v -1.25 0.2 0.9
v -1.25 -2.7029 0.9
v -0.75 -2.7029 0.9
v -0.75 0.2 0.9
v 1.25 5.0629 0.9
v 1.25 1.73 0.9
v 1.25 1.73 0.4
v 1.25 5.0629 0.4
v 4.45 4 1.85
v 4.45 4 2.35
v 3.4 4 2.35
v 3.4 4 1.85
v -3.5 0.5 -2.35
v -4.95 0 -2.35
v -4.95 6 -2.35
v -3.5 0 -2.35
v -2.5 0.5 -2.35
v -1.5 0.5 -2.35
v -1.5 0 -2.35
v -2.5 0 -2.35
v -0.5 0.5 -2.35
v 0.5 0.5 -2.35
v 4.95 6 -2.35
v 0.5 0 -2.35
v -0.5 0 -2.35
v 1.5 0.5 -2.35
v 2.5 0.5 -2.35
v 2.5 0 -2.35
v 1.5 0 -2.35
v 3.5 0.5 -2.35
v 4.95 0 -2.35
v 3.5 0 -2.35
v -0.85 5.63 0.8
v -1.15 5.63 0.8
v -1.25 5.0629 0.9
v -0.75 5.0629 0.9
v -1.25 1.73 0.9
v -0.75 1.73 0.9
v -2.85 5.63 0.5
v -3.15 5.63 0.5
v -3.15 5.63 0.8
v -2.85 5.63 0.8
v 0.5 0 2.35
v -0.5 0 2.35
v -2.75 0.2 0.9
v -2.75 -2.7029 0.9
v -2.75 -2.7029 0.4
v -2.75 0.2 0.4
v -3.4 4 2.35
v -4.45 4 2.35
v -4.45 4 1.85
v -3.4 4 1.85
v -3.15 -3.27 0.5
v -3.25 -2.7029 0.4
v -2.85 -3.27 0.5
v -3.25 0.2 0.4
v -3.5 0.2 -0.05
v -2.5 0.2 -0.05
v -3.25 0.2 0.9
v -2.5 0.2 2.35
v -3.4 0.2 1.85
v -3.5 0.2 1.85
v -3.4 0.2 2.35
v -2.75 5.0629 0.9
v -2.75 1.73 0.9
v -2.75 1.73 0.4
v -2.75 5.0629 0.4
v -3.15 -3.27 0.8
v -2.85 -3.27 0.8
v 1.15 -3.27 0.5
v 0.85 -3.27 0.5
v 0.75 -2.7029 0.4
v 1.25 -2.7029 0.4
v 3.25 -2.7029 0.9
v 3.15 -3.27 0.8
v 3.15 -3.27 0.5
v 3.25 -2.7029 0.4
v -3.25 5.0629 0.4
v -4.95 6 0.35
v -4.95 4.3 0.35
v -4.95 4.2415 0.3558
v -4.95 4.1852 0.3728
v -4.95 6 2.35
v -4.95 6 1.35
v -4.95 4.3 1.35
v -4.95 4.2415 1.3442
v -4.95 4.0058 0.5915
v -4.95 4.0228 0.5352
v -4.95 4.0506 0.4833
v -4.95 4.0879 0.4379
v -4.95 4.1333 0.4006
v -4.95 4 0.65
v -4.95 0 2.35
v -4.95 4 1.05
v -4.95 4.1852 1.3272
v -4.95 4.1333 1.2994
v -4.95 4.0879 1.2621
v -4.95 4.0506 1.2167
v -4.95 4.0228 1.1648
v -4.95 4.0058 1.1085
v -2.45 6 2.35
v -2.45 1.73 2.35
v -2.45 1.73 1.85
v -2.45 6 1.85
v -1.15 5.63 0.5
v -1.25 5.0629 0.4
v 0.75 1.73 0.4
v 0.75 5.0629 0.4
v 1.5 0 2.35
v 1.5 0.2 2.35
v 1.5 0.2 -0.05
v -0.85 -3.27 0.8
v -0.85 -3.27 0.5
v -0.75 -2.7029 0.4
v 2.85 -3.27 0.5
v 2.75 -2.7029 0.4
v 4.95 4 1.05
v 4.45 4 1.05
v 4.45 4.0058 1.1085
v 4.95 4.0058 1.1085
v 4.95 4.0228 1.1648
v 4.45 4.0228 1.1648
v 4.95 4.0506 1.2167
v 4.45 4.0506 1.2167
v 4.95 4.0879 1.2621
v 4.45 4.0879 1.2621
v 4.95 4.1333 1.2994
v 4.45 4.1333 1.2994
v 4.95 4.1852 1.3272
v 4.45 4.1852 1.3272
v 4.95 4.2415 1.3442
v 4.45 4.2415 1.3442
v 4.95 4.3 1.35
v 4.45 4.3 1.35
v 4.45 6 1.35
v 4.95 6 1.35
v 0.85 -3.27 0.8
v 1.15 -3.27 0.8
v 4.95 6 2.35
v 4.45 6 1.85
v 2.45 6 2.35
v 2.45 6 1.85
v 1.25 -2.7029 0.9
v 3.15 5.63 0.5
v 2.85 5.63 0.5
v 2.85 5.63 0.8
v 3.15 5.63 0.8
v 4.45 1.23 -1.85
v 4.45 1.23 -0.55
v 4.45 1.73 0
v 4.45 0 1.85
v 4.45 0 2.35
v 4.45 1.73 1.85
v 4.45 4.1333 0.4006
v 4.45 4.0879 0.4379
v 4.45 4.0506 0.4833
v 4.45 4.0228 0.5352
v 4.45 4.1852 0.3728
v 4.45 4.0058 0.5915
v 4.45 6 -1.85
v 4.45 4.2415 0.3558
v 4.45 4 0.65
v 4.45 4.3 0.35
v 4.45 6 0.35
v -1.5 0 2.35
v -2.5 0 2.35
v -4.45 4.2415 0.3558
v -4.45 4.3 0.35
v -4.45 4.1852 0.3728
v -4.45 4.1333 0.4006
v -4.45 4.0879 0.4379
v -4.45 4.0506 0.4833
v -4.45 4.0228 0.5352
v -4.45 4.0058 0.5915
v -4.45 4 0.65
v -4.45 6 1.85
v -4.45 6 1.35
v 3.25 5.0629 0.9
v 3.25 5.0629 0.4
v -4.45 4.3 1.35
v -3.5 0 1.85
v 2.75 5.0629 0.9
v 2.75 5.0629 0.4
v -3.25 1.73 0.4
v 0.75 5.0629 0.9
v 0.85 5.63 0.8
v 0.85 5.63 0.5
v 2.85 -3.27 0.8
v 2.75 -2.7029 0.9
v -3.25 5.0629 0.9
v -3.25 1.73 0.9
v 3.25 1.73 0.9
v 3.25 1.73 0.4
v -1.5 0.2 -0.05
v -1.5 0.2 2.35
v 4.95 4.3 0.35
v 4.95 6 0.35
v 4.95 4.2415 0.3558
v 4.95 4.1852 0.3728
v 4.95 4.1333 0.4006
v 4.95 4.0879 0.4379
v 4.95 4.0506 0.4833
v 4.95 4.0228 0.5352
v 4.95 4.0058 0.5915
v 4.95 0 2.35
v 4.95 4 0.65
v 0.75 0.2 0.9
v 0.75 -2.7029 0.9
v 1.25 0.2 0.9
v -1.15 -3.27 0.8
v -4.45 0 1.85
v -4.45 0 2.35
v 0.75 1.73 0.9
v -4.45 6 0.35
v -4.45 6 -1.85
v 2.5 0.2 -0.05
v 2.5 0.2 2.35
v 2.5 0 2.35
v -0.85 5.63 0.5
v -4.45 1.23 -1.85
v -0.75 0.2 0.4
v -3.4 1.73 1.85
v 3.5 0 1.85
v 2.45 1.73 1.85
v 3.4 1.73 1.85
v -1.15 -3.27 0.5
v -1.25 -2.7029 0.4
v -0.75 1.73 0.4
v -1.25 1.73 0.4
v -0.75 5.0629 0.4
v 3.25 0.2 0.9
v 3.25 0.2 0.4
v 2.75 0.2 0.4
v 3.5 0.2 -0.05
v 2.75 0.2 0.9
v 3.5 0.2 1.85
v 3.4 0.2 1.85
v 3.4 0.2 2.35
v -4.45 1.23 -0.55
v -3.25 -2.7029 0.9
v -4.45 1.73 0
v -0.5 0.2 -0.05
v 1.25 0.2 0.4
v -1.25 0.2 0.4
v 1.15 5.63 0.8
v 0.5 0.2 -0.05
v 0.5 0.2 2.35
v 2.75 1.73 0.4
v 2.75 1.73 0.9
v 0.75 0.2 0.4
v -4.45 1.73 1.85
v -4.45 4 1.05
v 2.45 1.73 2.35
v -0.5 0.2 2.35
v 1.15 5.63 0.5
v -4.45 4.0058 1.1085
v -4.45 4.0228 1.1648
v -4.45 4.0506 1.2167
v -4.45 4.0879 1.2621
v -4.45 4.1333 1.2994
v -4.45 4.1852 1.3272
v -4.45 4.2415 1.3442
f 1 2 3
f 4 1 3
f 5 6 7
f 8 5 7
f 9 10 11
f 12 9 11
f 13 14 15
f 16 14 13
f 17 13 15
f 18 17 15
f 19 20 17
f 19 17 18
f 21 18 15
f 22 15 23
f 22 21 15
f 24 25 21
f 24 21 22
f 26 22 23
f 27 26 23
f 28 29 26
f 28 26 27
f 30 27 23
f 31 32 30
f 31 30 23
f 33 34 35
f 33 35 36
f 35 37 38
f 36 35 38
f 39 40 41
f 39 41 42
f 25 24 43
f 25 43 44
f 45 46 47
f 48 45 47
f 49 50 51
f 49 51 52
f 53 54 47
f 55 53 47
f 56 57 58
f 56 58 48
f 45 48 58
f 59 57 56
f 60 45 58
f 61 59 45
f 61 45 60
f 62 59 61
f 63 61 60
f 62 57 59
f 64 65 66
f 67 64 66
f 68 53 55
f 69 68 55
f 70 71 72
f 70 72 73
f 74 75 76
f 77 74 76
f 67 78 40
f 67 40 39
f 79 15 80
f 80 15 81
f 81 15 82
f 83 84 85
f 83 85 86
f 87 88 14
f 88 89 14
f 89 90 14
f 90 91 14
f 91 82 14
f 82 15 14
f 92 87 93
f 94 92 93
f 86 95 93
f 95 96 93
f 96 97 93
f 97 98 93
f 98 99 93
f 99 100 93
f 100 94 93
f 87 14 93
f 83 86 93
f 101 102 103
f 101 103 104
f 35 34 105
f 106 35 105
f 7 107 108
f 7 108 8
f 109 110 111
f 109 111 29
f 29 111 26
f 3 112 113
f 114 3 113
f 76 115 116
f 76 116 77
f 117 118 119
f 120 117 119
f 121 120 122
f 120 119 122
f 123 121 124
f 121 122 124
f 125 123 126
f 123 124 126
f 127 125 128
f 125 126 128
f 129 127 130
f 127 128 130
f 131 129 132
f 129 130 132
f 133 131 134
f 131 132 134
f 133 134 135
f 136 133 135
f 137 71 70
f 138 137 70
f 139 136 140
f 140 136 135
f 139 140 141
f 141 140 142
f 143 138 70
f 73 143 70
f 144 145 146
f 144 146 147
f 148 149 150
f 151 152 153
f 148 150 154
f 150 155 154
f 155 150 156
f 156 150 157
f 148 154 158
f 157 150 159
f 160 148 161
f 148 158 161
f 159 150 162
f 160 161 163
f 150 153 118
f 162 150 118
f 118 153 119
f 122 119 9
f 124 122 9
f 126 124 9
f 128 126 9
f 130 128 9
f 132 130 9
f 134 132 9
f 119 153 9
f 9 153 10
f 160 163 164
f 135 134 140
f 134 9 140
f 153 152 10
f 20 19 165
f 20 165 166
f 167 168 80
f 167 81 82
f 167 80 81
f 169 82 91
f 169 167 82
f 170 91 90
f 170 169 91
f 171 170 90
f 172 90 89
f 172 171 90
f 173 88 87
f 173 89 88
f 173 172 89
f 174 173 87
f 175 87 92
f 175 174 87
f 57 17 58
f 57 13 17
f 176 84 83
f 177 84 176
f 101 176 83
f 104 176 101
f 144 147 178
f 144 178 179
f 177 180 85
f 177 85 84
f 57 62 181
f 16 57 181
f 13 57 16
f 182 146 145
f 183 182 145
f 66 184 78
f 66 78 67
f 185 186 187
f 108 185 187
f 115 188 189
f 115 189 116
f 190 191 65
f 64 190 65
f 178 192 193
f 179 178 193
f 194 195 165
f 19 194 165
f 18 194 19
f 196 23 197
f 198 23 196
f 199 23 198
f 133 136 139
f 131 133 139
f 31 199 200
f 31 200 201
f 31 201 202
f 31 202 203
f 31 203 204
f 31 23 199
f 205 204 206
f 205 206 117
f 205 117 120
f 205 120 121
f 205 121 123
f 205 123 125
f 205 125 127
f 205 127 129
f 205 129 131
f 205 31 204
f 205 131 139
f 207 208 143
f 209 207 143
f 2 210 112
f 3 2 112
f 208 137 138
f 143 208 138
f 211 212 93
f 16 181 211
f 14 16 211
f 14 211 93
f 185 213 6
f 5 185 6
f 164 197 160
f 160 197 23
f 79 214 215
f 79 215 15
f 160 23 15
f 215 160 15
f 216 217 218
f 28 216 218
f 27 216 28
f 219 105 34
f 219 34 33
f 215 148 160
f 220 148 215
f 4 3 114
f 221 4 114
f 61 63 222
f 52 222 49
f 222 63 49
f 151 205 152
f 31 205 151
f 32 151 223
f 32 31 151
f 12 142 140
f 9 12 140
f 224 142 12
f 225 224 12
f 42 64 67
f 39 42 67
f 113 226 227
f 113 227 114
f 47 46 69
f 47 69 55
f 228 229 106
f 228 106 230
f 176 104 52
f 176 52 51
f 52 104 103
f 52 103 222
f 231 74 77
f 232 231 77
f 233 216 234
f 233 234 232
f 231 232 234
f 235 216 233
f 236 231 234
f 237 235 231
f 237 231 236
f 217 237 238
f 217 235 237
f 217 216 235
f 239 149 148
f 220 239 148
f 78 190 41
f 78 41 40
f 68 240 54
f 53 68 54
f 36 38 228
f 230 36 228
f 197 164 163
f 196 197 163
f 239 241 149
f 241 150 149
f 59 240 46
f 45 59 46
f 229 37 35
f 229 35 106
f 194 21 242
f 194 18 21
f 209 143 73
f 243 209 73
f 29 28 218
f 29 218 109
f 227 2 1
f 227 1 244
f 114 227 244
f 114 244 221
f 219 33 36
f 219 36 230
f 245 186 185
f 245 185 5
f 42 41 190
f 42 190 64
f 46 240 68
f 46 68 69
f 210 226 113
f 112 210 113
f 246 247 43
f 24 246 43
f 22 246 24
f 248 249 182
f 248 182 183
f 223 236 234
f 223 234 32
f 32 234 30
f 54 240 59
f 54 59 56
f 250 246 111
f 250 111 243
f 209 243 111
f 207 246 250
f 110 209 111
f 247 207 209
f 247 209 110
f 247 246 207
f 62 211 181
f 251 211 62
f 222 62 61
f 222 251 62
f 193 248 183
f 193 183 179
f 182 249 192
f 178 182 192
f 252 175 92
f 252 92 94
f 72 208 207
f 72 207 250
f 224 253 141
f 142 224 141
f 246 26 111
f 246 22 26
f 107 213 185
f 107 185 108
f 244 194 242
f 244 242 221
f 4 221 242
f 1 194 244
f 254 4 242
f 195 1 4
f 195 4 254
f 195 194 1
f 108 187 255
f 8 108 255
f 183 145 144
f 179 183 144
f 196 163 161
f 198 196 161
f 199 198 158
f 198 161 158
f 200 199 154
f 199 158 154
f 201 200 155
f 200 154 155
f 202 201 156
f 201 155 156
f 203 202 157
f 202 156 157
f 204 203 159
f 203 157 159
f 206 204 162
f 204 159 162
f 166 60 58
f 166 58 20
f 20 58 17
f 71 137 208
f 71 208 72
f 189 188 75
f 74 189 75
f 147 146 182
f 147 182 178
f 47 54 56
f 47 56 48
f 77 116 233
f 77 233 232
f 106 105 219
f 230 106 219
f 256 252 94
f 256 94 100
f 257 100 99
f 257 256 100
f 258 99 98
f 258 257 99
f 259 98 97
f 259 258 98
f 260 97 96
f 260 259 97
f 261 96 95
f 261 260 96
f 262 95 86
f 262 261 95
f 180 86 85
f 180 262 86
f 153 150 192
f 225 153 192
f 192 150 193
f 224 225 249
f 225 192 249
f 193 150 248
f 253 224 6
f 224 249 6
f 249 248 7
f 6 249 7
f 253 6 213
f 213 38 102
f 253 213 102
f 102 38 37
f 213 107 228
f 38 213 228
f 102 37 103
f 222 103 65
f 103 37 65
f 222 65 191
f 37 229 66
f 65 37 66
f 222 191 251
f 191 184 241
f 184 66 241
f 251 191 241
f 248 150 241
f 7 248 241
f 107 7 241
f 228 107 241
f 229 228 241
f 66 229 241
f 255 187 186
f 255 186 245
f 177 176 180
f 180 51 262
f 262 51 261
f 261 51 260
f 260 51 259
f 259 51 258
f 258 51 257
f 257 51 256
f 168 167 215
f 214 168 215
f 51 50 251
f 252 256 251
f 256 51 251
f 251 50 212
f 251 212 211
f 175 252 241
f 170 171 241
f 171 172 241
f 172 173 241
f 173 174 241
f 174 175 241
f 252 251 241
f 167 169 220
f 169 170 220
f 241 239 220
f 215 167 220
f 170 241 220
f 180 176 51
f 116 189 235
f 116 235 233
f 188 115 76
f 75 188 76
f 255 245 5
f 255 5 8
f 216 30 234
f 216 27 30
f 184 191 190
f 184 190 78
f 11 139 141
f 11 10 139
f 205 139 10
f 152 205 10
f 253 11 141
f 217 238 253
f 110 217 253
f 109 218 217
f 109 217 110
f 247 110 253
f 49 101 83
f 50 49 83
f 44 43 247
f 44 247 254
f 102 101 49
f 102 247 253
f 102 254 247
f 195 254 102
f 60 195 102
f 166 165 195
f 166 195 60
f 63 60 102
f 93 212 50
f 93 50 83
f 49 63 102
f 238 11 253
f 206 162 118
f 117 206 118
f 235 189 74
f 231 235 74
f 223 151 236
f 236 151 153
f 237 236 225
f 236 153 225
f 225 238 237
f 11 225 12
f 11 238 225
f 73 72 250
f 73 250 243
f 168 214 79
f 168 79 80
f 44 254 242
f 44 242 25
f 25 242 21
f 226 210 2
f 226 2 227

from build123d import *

# Parameters (mm, degrees)
SKETCH_1_W                                 = 4.95
SKETCH_1_H                                 = 4.7
EXTRUDE_1_DEPTH                            = 1.73
EXTRUDE_2_DEPTH                            = 4.27
CUT_EXTRUDE_1_DEPTH                        = 1.5
CUT_EXTRUDE_3_DEPTH                        = 4.45
SKETCH_4_W                                 = 1.05
SKETCH_4_H                                 = 4
SKETCH_4_W_2                               = 2.45
SKETCH_4_H_2                               = 4.27
CUT_EXTRUDE_2_DEPTH                        = 0.5
CUT_EXTRUDE_4_DEPTH                        = 0.5
EXTRUDE_START                              = -5
SKETCH_5_W                                 = 0.5
SKETCH_5_H                                 = 0.5
EXTRUDE_3_DEPTH                            = 8.9
CHAMFER_1_SIZE                             = 0.1
CHAMFER_1_SIZE2                            = 0.567128182
CHAMFER_1_PART_2_SIZE                      = 0.1
CHAMFER_1_PART_2_SIZE2                     = 0.567128182
PATTERN_LINEAR_1_COUNT                     = 4
PATTERN_LINEAR_1_PITCH                     = 2
CHAMFER_1_OF_PATTERN_LINEAR_1_SIZE2        = 0.1
CHAMFER_1_OF_PATTERN_LINEAR_1_SIZE         = 0.567128182
CHAMFER_1_PART_2_OF_PATTERN_LINEAR_1_SIZE2 = 0.1
CHAMFER_1_PART_2_OF_PATTERN_LINEAR_1_SIZE  = 0.567128182


with BuildPart() as part:
    # Эскиз1 → Бобышка-Вытянуть1 (new body)
    with BuildSketch(Plane(origin=(0, 0, 0), x_dir=(1, 0, 0), z_dir=(0, 1, 0))):
        with Locations((-2.475, 0)):
            Rectangle(SKETCH_1_W, SKETCH_1_H)
    extrude_1 = extrude(amount=EXTRUDE_1_DEPTH)

    # Эскиз2 → Бобышка-Вытянуть2 (add)
    with BuildSketch(Plane(origin=(0, 1.73, 0), x_dir=(1, 0, 0), z_dir=(0, 1, 0))):
        Polygon((0, 2.35), (-4.95, 2.35), (-4.95, -2.35), (0, -2.35), (0, -1.85), (-4.45, -1.85), (-4.45, 1.85), (0, 1.85), align=None)
    extrude_2 = extrude(amount=EXTRUDE_2_DEPTH)

    # Эскиз3 → Вырез-Вытянуть1 (cut, through all)
    with BuildSketch(Plane(origin=(-4.45, 0, 0), x_dir=(0, 0, -1), z_dir=(1, 0, 0))):
        with BuildLine():
            Line((-1.35, 6), (-0.35, 6))
            Line((-0.35, 6), (-0.35, 4.3))
            ThreePointArc((-0.35, 4.3), (-0.437867966, 4.087867966), (-0.65, 4))
            Line((-0.65, 4), (-1.05, 4))
            ThreePointArc((-1.05, 4), (-1.262132034, 4.087867966), (-1.35, 4.3))
            Line((-1.35, 4.3), (-1.35, 6))
        make_face()
    cut_extrude_1 = extrude(amount=-CUT_EXTRUDE_1_DEPTH, mode=Mode.SUBTRACT)

    # Эскиз8 → Вырез-Вытянуть3 (cut)
    with BuildSketch(Plane(origin=(0, 0, 0), x_dir=(0, 0, -1), z_dir=(1, 0, 0))):
        Polygon((0, 1.73), (0.55, 1.23), (1.85, 1.23), (1.85, 1.73), align=None)
    cut_extrude_3 = extrude(amount=-CUT_EXTRUDE_3_DEPTH, mode=Mode.SUBTRACT)

    # Эскиз4 → Вырез-Вытянуть2 (cut)
    with BuildSketch(Plane.XY.offset(2.35)):
        with Locations((-3.925, 2)):
            Rectangle(SKETCH_4_W, SKETCH_4_H)
        with Locations((-1.225, 3.865)):
            Rectangle(SKETCH_4_W_2, SKETCH_4_H_2)
    cut_extrude_2 = extrude(amount=-CUT_EXTRUDE_2_DEPTH, mode=Mode.SUBTRACT)

    # Зеркальное отражение1: Бобышка-Вытянуть1, Бобышка-Вытянуть2, Вырез-Вытянуть1, Вырез-Вытянуть3, Вырез-Вытянуть2 across plane
    add(extrude_1.mirror(Plane(origin=(0, 0, 0), x_dir=(0, 0, 1), z_dir=(1, 0, 0))))
    add(extrude_2.mirror(Plane(origin=(0, 0, 0), x_dir=(0, 0, 1), z_dir=(1, 0, 0))))
    add(cut_extrude_1.mirror(Plane(origin=(0, 0, 0), x_dir=(0, 0, 1), z_dir=(1, 0, 0))), mode=Mode.SUBTRACT)
    add(cut_extrude_3.mirror(Plane(origin=(0, 0, 0), x_dir=(0, 0, 1), z_dir=(1, 0, 0))), mode=Mode.SUBTRACT)
    add(cut_extrude_2.mirror(Plane(origin=(0, 0, 0), x_dir=(0, 0, 1), z_dir=(1, 0, 0))), mode=Mode.SUBTRACT)

    # Эскиз9 → Вырез-Вытянуть4 (cut, symmetric)
    with BuildSketch(Plane.ZY.offset(3)):
        Polygon((2.35, 0), (-2.35, 0), (-2.35, 0.5), (-0.05, 0.2), (2.35, 0.2), align=None)
    cut_extrude_4 = extrude(amount=CUT_EXTRUDE_4_DEPTH, both=True, mode=Mode.SUBTRACT)

    # Эскиз5 → Бобышка-Вытянуть3 (add)
    with BuildSketch(Plane(origin=(0, 1.73, 0), x_dir=(1, 0, 0), z_dir=(0, 1, 0)).offset(EXTRUDE_START)):
        with Locations((-3, -0.65)):
            Rectangle(SKETCH_5_W, SKETCH_5_H)
    extrude_3 = extrude(amount=EXTRUDE_3_DEPTH)

    # Фаска1
    chamfer_1_edges = [part.edges().sort_by_distance(p)[0] for p in [
        (-3.25, 5.63, 0.65),
        (-3, 5.63, 0.4),
        (-2.75, 5.63, 0.65),
        (-3, 5.63, 0.9),
    ]]
    chamfer_1_side = [part.faces().sort_by_distance(p)[0] for p in [
        (-3, 5.63, 0.65),
    ]]
    chamfer(chamfer_1_edges, length=CHAMFER_1_SIZE, length2=CHAMFER_1_SIZE2, reference=chamfer_1_side[0])

    # Фаска1 part 2
    chamfer_1_part_2_edges = [part.edges().sort_by_distance(p)[0] for p in [
        (-3.25, -3.27, 0.65),
        (-3, -3.27, 0.4),
        (-2.75, -3.27, 0.65),
        (-3, -3.27, 0.9),
    ]]
    chamfer_1_part_2_side = [part.faces().sort_by_distance(p)[0] for p in [
        (-3, -3.27, 0.65),
    ]]
    chamfer(chamfer_1_part_2_edges, length=CHAMFER_1_PART_2_SIZE, length2=CHAMFER_1_PART_2_SIZE2, reference=chamfer_1_part_2_side[0])

    # Линейный массив1: Вырез-Вытянуть4, Бобышка-Вытянуть3 ×4
    with Locations(*[(i * PATTERN_LINEAR_1_PITCH, 0, 0) for i in range(1, PATTERN_LINEAR_1_COUNT)]):
        add(cut_extrude_4, mode=Mode.SUBTRACT)
        add(extrude_3)

    # Фаска1 of Линейный массив1
    chamfer_1_of_pattern_linear_1_edges = [part.edges().sort_by_distance(p)[0] for p in [
        (-1.25, 5.63, 0.65),
        (-1, 5.63, 0.4),
        (-0.75, 5.63, 0.65),
        (-1, 5.63, 0.9),
        (0.75, 5.63, 0.65),
        (1, 5.63, 0.4),
        (1.25, 5.63, 0.65),
        (1, 5.63, 0.9),
        (2.75, 5.63, 0.65),
        (3, 5.63, 0.4),
        (3.25, 5.63, 0.65),
        (3, 5.63, 0.9),
    ]]
    chamfer(chamfer_1_of_pattern_linear_1_edges, length=CHAMFER_1_OF_PATTERN_LINEAR_1_SIZE, length2=CHAMFER_1_OF_PATTERN_LINEAR_1_SIZE2)

    # Фаска1 part 2 of Линейный массив1
    chamfer_1_part_2_of_pattern_linear_1_edges = [part.edges().sort_by_distance(p)[0] for p in [
        (-1.25, -3.27, 0.65),
        (-1, -3.27, 0.4),
        (-0.75, -3.27, 0.65),
        (-1, -3.27, 0.9),
        (0.75, -3.27, 0.65),
        (1, -3.27, 0.4),
        (1.25, -3.27, 0.65),
        (1, -3.27, 0.9),
        (2.75, -3.27, 0.65),
        (3, -3.27, 0.4),
        (3.25, -3.27, 0.65),
        (3, -3.27, 0.9),
    ]]
    chamfer(chamfer_1_part_2_of_pattern_linear_1_edges, length=CHAMFER_1_PART_2_OF_PATTERN_LINEAR_1_SIZE, length2=CHAMFER_1_PART_2_OF_PATTERN_LINEAR_1_SIZE2)


solid = part.part
